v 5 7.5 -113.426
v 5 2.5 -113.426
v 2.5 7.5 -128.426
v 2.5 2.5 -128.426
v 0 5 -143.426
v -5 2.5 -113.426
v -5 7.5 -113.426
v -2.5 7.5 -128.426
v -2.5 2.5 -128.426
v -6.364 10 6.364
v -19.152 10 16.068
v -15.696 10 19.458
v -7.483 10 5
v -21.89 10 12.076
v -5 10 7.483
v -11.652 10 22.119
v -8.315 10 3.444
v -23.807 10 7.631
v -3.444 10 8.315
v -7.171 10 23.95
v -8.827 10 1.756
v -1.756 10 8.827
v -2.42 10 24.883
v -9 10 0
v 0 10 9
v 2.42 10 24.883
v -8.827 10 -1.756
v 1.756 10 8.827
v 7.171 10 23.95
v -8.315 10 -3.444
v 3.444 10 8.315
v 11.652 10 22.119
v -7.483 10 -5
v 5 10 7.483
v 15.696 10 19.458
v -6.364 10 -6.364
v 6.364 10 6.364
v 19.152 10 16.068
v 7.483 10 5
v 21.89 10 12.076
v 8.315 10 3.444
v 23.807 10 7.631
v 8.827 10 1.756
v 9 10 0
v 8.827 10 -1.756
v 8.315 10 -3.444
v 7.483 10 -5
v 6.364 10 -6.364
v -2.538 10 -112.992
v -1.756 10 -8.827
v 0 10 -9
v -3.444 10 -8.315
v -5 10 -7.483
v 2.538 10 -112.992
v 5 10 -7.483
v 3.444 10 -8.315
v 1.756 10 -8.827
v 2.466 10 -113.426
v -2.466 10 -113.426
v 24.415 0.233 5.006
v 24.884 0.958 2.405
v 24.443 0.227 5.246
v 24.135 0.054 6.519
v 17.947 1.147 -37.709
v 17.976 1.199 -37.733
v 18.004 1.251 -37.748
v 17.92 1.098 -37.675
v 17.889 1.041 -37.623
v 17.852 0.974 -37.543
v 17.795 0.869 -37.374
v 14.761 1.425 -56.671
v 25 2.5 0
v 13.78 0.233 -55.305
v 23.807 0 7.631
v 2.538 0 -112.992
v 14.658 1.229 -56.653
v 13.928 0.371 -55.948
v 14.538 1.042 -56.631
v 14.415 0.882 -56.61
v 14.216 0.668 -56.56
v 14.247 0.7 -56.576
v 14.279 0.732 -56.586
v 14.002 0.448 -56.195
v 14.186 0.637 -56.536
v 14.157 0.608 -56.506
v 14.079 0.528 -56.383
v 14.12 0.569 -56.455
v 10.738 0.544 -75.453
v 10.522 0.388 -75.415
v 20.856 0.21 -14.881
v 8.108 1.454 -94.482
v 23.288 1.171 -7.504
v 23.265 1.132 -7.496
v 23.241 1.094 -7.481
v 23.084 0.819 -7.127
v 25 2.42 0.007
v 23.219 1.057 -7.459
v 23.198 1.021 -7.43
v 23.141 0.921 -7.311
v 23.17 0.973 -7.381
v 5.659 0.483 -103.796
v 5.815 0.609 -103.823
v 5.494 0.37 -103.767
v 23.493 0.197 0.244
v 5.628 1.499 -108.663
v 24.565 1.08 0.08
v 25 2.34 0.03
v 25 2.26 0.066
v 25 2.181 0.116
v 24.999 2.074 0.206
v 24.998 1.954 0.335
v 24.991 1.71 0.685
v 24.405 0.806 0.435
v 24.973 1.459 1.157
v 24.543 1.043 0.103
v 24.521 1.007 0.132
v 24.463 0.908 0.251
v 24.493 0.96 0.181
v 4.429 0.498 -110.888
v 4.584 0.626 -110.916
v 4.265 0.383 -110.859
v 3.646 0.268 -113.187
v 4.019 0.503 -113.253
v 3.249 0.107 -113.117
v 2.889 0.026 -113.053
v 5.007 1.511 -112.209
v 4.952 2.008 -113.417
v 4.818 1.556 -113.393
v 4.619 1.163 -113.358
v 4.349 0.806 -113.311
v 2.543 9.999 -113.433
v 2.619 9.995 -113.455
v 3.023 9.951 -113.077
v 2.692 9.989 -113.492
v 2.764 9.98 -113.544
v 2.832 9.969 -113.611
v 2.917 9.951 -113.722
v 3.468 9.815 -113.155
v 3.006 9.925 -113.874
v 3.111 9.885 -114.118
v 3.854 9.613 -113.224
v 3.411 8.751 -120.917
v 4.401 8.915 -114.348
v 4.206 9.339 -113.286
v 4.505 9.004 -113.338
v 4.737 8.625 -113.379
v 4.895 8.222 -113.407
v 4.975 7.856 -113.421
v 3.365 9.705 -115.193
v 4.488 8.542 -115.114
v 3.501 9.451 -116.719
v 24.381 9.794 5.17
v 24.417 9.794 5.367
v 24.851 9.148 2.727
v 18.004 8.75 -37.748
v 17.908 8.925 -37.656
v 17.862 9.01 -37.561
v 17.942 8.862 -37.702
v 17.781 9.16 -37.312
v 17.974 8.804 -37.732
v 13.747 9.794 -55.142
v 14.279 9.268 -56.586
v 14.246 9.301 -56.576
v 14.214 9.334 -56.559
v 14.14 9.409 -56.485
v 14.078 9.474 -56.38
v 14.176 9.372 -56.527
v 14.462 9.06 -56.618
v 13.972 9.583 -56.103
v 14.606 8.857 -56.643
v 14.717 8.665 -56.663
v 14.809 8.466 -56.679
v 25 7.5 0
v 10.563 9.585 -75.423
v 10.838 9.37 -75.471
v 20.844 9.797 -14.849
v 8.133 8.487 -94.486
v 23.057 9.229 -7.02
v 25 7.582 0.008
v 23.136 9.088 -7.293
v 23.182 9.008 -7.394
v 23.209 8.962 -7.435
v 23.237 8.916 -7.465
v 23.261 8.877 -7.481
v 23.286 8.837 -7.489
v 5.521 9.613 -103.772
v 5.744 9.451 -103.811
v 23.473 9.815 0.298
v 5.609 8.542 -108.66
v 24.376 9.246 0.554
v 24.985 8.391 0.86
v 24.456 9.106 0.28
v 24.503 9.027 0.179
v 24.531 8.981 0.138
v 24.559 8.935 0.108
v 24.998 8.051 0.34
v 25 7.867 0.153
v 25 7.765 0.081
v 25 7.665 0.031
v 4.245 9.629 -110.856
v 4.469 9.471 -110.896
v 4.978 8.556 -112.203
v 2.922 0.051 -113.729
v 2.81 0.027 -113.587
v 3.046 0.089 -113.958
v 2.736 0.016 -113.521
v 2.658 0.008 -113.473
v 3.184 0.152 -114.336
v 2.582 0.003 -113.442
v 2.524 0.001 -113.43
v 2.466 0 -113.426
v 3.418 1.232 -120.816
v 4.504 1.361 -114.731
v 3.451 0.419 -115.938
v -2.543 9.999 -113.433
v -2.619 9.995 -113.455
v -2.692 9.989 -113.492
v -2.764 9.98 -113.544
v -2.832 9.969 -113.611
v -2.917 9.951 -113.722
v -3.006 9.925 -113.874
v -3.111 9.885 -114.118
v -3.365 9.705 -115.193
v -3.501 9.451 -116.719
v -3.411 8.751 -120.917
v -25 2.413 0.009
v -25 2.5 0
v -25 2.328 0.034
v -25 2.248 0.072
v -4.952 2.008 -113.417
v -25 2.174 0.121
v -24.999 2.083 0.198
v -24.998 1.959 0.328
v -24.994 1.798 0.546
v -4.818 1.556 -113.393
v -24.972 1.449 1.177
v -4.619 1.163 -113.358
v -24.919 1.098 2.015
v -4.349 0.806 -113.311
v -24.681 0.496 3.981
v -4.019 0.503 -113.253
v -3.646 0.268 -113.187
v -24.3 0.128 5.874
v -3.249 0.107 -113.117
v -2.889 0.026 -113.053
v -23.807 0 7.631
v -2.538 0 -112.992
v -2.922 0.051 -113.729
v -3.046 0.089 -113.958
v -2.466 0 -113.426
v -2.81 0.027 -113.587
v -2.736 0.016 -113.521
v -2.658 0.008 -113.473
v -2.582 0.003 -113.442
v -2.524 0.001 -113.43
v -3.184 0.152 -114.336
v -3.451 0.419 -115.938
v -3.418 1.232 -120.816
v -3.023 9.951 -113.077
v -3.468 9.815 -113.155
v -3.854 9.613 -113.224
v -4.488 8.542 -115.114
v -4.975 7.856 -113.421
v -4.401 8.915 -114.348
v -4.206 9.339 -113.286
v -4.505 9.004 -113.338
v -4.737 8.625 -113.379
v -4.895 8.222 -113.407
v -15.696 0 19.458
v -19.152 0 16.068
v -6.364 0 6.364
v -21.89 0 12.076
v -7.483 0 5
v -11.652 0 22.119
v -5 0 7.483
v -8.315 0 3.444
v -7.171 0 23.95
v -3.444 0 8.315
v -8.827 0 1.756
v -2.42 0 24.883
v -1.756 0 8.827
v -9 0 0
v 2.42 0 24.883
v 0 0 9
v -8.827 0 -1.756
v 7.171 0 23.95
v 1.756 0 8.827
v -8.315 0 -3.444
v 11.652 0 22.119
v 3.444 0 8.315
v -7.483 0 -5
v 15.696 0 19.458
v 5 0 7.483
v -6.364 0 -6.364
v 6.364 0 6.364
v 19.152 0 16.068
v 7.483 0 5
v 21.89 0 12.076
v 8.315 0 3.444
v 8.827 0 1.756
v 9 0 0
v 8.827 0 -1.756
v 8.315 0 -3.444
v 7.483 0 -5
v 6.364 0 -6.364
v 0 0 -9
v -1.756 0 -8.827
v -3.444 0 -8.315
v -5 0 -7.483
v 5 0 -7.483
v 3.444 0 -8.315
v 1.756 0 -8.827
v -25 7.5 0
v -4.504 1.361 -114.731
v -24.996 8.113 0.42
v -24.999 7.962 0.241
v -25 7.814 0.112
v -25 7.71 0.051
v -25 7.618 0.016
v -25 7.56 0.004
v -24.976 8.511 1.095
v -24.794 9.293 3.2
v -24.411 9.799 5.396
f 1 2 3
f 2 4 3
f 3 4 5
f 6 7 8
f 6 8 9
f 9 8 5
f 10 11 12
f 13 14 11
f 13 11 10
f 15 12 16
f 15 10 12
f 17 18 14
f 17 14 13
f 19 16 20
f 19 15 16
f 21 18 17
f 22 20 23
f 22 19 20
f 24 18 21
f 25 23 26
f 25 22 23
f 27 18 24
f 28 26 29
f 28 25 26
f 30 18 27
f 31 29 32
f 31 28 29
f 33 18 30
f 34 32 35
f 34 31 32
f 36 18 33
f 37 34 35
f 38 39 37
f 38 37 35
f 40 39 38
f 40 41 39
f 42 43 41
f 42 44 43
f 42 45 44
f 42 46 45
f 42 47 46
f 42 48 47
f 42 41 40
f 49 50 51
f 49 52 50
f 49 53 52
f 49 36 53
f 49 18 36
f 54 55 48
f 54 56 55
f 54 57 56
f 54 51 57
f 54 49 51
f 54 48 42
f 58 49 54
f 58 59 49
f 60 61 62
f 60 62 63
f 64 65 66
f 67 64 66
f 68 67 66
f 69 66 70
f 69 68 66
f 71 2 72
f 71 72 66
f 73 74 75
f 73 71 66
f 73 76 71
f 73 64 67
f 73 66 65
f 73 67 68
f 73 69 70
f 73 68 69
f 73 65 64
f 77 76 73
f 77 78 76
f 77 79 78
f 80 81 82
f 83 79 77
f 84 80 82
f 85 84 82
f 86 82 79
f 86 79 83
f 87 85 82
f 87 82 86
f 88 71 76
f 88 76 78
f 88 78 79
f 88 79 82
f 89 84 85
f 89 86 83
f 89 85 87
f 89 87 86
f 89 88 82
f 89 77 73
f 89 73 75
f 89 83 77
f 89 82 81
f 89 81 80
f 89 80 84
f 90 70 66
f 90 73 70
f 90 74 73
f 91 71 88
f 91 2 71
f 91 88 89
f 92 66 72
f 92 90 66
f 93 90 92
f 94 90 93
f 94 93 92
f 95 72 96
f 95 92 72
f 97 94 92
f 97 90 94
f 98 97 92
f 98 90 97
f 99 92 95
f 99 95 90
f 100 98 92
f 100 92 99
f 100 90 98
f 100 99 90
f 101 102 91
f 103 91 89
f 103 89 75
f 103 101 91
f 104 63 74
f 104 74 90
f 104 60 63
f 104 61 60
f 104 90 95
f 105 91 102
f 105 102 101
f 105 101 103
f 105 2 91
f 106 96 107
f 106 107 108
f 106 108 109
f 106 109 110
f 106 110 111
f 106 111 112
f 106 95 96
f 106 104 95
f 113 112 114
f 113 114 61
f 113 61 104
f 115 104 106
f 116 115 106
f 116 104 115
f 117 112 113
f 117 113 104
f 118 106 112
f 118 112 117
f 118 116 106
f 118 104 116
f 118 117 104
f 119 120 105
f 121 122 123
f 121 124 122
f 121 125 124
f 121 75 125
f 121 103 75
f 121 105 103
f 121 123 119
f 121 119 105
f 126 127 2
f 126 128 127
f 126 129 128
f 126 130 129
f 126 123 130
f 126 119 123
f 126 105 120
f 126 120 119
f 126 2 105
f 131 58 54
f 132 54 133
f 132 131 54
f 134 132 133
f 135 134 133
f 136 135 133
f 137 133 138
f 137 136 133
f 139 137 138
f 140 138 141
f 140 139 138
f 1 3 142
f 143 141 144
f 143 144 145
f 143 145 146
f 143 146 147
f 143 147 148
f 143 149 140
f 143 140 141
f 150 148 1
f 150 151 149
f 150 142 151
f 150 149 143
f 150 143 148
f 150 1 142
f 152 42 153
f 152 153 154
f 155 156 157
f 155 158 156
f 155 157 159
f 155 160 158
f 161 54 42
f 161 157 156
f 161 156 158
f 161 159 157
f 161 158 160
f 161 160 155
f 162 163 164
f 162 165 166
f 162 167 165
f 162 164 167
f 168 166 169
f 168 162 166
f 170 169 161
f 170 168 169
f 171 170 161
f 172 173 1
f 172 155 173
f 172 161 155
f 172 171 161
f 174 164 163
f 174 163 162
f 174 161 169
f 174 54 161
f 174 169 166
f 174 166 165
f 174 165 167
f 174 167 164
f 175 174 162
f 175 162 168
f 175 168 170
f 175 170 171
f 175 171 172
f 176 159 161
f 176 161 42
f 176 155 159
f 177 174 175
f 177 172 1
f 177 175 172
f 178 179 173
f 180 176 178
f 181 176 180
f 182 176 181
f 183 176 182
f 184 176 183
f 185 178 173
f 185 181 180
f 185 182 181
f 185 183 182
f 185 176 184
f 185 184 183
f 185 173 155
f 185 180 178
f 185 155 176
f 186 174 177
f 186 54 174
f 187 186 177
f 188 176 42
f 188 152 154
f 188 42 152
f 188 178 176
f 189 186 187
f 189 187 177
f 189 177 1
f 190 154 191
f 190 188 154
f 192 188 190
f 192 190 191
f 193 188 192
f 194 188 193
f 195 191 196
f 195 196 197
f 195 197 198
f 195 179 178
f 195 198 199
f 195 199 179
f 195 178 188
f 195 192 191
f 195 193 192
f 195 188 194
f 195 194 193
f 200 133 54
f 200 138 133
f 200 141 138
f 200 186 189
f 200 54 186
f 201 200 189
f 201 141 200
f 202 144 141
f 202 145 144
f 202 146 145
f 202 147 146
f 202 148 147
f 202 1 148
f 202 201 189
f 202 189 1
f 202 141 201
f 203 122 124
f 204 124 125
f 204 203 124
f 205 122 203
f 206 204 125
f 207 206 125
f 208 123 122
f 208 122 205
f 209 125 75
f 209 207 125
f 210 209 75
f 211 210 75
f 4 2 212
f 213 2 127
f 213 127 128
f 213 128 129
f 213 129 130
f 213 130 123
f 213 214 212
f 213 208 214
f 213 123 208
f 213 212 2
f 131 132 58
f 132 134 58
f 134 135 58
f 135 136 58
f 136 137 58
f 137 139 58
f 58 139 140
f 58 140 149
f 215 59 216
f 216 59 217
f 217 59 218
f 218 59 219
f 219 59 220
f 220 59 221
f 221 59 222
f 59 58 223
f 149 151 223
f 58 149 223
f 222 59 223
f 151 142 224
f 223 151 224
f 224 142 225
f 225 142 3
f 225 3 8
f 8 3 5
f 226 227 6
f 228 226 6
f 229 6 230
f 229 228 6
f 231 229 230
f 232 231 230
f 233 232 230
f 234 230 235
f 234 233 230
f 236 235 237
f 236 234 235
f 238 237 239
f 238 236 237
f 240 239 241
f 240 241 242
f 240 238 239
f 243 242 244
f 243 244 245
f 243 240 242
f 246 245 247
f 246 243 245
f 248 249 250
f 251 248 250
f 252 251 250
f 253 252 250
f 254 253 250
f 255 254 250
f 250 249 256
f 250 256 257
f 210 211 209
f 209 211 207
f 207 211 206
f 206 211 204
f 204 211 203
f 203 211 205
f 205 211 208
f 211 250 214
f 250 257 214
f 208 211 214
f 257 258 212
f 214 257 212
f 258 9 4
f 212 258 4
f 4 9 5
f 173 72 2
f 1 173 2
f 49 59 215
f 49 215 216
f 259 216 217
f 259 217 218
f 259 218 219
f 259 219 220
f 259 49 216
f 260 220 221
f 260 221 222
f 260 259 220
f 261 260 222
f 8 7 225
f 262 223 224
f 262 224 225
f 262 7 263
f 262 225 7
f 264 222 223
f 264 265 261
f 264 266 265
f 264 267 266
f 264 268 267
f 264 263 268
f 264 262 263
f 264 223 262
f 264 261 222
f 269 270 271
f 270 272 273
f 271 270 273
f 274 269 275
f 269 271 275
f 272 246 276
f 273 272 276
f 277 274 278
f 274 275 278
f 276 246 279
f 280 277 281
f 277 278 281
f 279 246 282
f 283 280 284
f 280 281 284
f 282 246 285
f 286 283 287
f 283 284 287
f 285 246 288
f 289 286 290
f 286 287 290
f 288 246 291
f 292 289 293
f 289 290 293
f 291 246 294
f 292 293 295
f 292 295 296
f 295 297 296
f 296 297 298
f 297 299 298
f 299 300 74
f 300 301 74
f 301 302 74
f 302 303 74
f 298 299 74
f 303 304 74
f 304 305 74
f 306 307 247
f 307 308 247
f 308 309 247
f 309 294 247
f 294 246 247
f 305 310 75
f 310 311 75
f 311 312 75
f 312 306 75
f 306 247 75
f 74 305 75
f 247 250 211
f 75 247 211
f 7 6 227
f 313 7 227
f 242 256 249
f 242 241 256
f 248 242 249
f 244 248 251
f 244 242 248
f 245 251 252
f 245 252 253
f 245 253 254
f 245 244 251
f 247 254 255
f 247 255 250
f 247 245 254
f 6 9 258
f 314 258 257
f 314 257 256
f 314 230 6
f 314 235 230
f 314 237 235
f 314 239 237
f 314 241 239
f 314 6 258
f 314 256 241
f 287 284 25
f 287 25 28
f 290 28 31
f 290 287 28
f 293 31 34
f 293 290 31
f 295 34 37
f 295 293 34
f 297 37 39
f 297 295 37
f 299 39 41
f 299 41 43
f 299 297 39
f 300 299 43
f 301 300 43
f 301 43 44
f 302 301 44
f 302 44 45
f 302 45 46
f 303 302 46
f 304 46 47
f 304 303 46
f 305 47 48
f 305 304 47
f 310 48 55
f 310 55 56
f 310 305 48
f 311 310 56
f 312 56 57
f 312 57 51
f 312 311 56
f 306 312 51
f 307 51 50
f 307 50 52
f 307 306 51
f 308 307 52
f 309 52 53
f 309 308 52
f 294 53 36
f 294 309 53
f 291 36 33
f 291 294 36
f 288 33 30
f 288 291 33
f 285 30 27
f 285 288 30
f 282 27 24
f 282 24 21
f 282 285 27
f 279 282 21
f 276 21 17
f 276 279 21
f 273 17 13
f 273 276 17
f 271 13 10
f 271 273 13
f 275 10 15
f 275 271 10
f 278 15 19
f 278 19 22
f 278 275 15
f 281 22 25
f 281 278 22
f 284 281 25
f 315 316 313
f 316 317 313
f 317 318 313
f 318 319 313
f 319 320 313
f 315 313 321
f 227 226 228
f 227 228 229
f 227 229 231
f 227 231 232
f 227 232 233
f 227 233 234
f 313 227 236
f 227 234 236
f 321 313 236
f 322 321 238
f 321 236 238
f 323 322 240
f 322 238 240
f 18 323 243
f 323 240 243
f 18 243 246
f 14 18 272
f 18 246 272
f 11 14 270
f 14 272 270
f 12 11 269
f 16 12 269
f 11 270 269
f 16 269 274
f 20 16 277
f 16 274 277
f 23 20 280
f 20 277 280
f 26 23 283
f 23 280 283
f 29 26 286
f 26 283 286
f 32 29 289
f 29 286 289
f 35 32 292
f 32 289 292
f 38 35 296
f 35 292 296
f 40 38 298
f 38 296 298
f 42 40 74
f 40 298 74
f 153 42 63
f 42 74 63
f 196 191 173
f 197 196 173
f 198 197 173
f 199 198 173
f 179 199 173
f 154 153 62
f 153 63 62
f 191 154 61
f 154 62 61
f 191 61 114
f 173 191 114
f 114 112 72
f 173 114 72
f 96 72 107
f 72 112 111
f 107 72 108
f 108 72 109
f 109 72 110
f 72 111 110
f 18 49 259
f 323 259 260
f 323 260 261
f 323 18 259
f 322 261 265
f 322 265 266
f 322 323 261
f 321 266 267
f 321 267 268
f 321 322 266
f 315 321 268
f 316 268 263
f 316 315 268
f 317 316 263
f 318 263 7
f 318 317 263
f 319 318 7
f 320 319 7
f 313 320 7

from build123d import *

# Parameters (mm, degrees)
SKETCH1_R           = 9
BOSS_EXTRUDE1_DEPTH = 10
FILLET11_R          = 2.5


with BuildPart() as part:
    # Sketch1 → Boss-Extrude1 (new body)
    with BuildSketch(Plane(origin=(0, 0, 0), x_dir=(1, 0, 0), z_dir=(0, 1, 0))):
        with BuildLine():
            Line((25, 0), (5, 113.425636392))
            Line((5, 113.425636392), (-5, 113.425636392))
            Line((-5, 113.425636392), (-25, 0))
            ThreePointArc((-25, 0), (0, -25), (25, 0))
        make_face()
        with Locations(Location((0, 0, 0), (0, 0, 270))):
            Circle(SKETCH1_R, mode=Mode.SUBTRACT)
    extrude(amount=BOSS_EXTRUDE1_DEPTH)

    # Sketch4 → Loft2 section 0
    with BuildSketch(Plane(origin=(0, 0, -113.425636392), x_dir=(-1, 0, 0), z_dir=(0, 0, -1)), mode=Mode.PRIVATE) as loft2_s0:
        with BuildLine():
            Line((-5, 10), (5, 10))
            Line((5, 10), (5, 0))
            Line((5, 0), (-5, 0))
            Line((-5, 0), (-5, 10))
        make_face()
    loft([loft2_s0.sketch, Vertex(0, 5, -143.425636392)])

    # Fillet11
    fillet11_edges = [part.edges().sort_by_distance(p)[0] for p in [
        (15, 0, -56.712818196),
        (15, 10, -56.712818196),
        (-15, 0, -56.712818196),
        (-15, 10, -56.712818196),
    ]]
    fillet(fillet11_edges, radius=FILLET11_R)


solid = part.part
